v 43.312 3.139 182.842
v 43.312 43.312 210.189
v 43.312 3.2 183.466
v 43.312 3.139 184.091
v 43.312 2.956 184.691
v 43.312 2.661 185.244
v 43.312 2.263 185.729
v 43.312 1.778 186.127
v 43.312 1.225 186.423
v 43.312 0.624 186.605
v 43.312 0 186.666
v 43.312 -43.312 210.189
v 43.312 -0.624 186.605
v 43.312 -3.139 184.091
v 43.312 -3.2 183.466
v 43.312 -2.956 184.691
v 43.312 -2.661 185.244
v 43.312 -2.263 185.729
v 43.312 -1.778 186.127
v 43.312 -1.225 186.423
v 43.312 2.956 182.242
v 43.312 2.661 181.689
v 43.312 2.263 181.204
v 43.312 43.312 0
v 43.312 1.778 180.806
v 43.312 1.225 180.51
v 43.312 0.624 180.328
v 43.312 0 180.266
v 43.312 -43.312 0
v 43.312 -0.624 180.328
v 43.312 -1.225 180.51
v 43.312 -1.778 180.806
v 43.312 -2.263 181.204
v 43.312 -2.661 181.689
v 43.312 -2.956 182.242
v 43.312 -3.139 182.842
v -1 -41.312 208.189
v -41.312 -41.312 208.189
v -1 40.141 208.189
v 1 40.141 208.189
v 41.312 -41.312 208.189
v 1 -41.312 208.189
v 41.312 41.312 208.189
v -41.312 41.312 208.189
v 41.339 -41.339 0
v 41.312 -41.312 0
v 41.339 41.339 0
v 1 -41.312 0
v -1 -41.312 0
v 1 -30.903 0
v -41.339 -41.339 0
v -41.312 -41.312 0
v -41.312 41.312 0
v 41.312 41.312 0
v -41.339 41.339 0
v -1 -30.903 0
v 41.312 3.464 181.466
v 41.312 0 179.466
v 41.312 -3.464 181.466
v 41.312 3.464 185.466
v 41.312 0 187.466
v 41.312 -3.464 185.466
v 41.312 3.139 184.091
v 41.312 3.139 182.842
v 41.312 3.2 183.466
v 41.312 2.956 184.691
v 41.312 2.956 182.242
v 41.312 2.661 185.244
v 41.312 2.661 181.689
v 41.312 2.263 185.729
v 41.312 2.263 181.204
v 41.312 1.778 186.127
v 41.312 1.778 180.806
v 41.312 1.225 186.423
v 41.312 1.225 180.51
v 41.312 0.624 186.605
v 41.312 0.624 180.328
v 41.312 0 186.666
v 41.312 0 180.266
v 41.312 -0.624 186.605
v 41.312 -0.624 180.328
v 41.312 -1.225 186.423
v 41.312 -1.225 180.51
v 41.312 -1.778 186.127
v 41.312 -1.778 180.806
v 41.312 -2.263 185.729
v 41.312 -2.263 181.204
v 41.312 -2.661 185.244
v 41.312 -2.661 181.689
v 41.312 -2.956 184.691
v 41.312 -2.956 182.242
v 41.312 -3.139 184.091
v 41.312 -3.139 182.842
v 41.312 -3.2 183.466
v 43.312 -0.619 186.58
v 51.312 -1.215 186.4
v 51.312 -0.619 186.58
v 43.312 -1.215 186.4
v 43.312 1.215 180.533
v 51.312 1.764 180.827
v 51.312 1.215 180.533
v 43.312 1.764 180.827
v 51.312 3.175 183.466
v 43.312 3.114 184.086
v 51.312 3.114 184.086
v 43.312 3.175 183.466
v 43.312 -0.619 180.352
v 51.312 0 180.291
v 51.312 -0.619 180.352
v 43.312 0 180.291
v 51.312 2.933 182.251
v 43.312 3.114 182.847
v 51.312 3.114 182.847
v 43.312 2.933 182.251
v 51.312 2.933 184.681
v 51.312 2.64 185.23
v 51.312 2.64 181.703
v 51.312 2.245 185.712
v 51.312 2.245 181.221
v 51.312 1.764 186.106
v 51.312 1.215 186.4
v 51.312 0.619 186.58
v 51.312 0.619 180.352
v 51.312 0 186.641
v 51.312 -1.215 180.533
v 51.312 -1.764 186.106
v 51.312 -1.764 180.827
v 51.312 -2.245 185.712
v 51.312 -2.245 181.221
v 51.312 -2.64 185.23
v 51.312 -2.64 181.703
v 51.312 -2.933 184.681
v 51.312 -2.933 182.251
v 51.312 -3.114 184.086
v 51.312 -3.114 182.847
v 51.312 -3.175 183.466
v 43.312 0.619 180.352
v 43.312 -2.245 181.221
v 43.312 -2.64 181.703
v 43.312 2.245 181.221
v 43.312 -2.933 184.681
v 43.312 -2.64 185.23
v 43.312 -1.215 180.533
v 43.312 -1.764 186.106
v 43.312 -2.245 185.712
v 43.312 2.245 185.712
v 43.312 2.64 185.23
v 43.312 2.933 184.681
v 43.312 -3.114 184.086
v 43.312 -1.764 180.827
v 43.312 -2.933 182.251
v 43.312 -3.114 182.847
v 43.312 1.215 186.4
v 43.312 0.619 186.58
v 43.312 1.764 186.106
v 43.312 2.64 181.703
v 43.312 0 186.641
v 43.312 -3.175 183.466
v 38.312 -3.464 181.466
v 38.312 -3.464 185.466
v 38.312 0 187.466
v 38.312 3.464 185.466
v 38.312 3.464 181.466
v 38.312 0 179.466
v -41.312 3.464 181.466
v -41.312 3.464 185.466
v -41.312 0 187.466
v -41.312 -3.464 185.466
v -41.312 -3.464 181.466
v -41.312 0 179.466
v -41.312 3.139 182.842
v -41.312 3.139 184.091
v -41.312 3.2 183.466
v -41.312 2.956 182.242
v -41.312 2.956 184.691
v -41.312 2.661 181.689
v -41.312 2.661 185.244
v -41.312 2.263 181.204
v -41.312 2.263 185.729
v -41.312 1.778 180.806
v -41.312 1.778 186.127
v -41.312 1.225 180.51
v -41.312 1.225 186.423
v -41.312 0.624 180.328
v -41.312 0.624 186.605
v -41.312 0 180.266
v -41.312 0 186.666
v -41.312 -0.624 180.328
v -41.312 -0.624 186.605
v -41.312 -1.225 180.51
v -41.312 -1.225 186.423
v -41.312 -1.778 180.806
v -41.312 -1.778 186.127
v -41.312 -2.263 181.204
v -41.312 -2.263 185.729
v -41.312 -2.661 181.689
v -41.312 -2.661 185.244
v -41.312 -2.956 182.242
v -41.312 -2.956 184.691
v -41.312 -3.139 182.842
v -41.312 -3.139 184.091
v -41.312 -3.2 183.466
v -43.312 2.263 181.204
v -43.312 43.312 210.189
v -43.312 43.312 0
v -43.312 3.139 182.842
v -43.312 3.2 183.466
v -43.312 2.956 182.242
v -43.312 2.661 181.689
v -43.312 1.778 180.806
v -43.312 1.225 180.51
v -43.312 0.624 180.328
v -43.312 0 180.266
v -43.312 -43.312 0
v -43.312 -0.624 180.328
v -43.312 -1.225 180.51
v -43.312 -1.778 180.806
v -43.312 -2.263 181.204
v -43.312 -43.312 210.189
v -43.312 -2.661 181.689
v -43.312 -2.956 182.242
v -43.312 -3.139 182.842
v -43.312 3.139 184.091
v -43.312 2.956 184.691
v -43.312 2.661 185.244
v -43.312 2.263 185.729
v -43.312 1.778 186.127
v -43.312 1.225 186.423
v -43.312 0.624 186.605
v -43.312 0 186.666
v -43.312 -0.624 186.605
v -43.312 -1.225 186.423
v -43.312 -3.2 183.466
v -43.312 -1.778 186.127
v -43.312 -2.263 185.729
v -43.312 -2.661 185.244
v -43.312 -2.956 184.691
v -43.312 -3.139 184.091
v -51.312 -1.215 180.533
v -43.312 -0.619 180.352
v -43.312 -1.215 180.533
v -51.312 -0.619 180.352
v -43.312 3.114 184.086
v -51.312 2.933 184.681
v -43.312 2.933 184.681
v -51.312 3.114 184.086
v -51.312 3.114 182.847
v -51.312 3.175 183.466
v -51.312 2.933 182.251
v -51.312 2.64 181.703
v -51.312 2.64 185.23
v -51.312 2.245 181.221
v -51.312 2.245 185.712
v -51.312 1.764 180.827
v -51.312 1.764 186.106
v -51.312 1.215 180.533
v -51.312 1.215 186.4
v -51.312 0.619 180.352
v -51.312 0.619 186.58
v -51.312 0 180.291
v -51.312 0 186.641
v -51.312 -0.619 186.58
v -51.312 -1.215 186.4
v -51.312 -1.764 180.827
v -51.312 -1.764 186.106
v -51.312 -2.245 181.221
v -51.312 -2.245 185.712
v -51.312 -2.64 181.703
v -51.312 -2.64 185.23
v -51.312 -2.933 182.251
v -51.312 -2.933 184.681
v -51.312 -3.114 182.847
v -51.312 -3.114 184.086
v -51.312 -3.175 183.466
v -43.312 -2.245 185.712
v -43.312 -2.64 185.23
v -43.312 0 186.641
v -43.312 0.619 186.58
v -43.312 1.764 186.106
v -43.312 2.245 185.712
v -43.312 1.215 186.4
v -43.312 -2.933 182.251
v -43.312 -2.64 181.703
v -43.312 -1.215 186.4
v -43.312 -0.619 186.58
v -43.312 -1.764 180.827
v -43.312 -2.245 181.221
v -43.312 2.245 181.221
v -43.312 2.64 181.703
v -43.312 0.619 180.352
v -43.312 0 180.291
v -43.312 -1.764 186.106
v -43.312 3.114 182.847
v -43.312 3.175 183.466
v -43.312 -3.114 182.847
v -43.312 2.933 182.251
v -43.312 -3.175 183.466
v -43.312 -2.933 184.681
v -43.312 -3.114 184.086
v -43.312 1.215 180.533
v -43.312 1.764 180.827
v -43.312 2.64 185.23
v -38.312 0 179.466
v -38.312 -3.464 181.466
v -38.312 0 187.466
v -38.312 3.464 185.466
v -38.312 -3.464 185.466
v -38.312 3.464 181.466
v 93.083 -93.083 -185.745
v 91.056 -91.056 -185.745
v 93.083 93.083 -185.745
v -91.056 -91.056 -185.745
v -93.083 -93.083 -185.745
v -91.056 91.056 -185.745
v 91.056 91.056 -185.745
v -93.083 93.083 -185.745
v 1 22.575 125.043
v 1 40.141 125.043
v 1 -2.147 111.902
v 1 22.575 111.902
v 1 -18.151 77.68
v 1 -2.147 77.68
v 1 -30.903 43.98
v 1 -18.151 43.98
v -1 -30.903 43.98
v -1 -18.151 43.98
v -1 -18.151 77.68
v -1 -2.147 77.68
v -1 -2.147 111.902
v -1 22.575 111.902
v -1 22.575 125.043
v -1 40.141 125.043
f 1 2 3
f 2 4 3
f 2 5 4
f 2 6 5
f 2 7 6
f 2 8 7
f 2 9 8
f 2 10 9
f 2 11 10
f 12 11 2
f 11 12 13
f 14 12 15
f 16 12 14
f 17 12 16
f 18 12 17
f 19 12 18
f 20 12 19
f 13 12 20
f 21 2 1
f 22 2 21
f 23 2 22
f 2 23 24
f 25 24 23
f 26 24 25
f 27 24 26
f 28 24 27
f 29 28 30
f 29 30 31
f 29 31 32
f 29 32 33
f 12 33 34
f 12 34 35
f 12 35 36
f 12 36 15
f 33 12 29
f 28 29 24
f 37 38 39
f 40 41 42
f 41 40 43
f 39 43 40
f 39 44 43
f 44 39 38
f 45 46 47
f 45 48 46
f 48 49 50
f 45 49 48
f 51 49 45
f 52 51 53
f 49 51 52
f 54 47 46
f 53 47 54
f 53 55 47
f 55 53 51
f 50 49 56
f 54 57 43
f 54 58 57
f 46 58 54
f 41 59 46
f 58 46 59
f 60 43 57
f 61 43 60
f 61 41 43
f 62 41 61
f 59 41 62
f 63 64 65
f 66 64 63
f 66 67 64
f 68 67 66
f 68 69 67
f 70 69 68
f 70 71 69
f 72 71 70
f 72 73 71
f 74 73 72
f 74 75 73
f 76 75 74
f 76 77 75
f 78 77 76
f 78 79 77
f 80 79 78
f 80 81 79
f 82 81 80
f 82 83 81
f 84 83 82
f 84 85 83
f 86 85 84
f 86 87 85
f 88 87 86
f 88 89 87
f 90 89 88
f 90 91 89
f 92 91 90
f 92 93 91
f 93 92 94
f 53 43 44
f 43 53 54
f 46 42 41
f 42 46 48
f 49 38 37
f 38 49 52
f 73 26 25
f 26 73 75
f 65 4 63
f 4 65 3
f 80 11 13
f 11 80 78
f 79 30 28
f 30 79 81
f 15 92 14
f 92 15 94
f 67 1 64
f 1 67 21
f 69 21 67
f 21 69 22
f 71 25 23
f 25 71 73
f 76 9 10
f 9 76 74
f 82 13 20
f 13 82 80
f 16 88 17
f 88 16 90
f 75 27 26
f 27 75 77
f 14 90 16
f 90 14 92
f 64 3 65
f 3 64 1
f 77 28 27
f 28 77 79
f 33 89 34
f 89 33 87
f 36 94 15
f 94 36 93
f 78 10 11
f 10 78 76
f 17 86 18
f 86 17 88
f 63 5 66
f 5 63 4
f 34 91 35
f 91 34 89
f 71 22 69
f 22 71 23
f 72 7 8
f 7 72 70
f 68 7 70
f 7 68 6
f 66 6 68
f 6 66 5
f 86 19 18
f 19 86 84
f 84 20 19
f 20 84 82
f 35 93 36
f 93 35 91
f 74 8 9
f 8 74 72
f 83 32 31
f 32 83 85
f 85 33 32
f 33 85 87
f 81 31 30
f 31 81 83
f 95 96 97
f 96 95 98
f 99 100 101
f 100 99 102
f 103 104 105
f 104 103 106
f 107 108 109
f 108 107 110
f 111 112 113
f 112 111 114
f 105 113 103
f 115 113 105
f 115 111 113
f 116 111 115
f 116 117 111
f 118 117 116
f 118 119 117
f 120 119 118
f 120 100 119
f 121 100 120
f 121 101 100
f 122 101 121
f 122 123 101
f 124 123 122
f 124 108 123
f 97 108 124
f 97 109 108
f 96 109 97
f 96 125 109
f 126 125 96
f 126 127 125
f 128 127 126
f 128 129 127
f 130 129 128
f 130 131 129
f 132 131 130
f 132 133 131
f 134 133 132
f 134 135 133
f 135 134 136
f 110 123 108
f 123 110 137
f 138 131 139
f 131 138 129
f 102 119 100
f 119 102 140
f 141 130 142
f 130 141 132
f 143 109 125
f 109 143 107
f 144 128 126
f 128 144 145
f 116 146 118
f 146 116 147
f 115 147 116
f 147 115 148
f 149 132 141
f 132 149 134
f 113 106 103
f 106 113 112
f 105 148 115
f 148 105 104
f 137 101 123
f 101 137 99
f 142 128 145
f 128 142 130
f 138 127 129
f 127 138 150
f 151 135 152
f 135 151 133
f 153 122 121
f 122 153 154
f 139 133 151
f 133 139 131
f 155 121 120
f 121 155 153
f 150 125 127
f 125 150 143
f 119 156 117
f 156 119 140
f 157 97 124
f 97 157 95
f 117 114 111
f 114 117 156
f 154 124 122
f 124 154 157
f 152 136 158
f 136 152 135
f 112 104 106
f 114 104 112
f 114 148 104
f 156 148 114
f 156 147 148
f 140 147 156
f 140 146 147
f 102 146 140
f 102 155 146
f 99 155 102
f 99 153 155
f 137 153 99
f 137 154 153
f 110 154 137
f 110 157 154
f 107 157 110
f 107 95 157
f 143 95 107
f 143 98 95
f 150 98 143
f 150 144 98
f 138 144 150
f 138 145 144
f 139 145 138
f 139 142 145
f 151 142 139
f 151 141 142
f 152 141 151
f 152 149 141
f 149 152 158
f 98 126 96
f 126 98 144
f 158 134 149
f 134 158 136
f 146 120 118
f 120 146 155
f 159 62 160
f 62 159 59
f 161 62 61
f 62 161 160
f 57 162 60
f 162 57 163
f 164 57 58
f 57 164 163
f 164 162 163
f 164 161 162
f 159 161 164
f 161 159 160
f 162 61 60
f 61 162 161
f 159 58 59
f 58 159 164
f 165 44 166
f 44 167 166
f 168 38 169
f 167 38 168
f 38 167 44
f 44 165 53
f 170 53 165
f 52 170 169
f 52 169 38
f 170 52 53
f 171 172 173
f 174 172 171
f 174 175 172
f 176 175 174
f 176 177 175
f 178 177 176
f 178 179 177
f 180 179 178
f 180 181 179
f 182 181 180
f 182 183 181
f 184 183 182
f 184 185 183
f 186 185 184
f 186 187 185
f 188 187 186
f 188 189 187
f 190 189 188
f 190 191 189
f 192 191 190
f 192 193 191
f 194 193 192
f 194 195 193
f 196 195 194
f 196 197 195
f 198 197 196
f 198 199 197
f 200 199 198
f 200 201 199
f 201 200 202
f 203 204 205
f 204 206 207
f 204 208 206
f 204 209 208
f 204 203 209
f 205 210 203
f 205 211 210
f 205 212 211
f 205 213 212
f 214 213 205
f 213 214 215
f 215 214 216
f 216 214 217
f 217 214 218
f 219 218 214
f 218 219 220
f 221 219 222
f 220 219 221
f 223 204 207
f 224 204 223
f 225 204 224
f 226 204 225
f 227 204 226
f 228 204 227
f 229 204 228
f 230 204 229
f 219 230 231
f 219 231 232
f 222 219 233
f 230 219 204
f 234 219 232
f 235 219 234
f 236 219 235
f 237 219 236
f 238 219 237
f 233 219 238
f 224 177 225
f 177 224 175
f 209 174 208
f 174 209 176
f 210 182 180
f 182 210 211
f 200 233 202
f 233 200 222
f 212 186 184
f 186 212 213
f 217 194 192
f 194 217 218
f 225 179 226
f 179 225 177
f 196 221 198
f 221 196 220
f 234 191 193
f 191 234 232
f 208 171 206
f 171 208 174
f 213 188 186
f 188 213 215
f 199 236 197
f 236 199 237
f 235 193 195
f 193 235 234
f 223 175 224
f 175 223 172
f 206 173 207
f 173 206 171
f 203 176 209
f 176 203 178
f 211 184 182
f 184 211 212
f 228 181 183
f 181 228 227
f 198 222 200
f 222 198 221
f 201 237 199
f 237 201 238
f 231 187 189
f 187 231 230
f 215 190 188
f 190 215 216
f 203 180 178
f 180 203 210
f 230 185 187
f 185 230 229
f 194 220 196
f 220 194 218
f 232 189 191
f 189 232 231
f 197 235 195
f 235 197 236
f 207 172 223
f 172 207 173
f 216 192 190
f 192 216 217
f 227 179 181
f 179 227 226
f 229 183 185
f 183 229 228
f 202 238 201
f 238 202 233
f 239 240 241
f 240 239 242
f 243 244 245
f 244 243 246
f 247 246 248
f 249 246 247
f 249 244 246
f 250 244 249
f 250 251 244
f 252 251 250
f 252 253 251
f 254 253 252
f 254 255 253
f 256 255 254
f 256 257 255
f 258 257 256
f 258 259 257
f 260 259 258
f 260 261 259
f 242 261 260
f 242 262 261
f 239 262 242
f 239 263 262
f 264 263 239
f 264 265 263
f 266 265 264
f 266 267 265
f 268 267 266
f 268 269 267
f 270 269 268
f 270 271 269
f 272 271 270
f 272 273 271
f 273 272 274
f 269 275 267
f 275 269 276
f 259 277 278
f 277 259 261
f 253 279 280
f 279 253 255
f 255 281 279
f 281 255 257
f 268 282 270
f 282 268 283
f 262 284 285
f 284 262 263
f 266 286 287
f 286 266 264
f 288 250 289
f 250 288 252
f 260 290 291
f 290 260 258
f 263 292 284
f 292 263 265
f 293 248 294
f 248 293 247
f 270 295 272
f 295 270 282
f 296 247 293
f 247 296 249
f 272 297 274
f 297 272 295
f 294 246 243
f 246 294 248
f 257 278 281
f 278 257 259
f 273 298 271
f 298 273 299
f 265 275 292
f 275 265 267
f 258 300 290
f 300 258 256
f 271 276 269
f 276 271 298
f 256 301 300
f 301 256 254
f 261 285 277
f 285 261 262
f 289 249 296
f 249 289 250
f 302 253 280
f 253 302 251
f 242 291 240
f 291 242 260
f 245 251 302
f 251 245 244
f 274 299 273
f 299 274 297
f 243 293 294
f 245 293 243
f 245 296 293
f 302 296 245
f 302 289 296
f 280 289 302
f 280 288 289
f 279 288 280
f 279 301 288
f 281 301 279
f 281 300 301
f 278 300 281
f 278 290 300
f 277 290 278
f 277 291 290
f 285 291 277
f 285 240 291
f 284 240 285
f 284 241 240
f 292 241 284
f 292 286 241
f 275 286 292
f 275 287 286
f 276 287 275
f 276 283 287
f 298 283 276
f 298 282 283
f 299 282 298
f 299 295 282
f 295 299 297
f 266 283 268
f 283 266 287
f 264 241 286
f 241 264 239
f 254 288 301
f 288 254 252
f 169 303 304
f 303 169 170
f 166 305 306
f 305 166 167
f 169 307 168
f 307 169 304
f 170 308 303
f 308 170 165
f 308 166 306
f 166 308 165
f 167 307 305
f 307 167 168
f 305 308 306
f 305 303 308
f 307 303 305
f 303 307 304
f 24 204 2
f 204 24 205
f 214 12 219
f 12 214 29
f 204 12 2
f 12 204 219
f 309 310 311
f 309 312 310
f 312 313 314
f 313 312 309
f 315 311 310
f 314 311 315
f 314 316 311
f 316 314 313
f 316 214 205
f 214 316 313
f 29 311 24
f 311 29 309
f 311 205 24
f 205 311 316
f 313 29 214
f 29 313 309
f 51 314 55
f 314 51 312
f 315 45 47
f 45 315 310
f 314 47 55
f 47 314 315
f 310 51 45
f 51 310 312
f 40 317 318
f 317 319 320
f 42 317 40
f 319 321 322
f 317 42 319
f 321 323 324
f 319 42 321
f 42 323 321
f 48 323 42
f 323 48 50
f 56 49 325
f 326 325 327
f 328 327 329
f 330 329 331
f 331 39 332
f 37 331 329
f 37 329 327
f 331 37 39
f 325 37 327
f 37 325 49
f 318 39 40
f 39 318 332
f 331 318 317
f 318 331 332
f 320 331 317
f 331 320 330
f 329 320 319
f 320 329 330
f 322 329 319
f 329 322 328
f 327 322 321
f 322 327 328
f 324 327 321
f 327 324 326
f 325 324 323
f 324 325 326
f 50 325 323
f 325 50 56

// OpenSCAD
// OK1DFC Stepped Septum Feed for 2304 MHz — v9
// ORI / W5NYV — April 2026
//
// CONSTRUCTION: Sheet metal, 2mm 6061 aluminum throughout
// PIECES:
//   1. U-channel half A  — wide face + two flanges (bent from flat blank)
//   2. U-channel half B  — same, mirrors A
//   3. Septum plate      — stepped flat plate with flanges,
//                          captured between U-channel flanges when assembled
//   4. Back plate        — closes backshort end, flanged all four sides
//   + Flare              — aluminum flashing, square-to-circular, separate piece
//                          (KA1GT/KA1GT construction: rolled cylinder, one end deformed to square)
//
// ALL PROPORTIONAL CONSTANTS from Chen & Tsandoulas stepped septum paper
// Scaled via OK1DFC spreadsheet. Verified by W1GHZ HFSS simulation.
// Design proven at 1296, 2320, 3400 MHz by KI6DHU, KL6M, KA1GT, RA3AQ and others.
//
// ELECTRICAL SURFACES ONLY — flanges and bend allowances not modeled.
// This file is the ground truth for electrical dimensions.

// ============================================================
// PARAMETERS
// ============================================================
lambda    = 299792 / 2304;
t         = 2.0;             // sheet thickness — 2mm Al everywhere

wg_id     = 0.635 * lambda;  // inner dimension
// 0.635 is from the Chen & Tsandoulas paper on stepped septum polarizers
wg_od     = wg_id + 2*t;     // outer dimension

// step positions along the length of the septum
sA = 0.338 * lambda;
sB = 0.597 * lambda;
sC = 0.860 * lambda;
sD = 0.961 * lambda;

body_len = 1.600 * lambda;   // calculated minimum body length

// Body length needs to be long enough for the following things.
//1. Section before septum starts:    allow spurious modes to die out
//                                    so only TE10 reaches the septum.
//                                    This means we're single mode.
//2. The four stepped sections:       A through D = 0.961λ total
//                                    The A, B, C, D positions
//                                    create exactly 90° phase difference 
//                                    between the TE10 and TE01 modes 
//                                    at the design frequency.
//3. Full-height section after sD:    from sD to body_len = 0.639λ
//                                    allows modes to recombine cleanly.

//heights of each step of our septum profile
sF = 0.080 * lambda;
sG = 0.178 * lambda;
sH = 0.301 * lambda;
sI = 0.491 * lambda;
sJ = 0.626 * lambda;         

//The steps are carefully calculated to create exactly 90° of phase 
//difference between the two polarization components, which is 
//what produces circular polarization.


// Next, we get the probe position, measured from the back plate 
// toward the aperture. This is the distance that places the probe 
// at the correct location in the standing wave pattern inside 
// the waveguide for maximum good vibes. 

probe_z_from_end = 0.190 * lambda;

// SMA female bulkhead connector
// Huber+Suhner 21_SMA-50-2-15/111_NE (Paul Wade W1GHZ has multiples in stock)
// Straight bulkhead jack, solder attachment, 18 GHz, 50 ohm
// Designed for .086" semi-rigid cable (RG405)
// Center contact: solder cup, ~0.5-0.6mm hole for center conductor
// Body OD: 6.35mm (standard SMA)
// Panel hole: 6.4mm (6.35mm body + 0.05mm clearance)
// Nut: standard SMA hex nut, tightens on inside of wall
// Probe pin: ~0.5mm solid copper or brass wire, soldered into solder cup
//            total pin length = 24.1mm from inner wall face (M = 0.185*lambda)
//            cut wire to: 24.1mm + solder cup depth (~3mm) = ~27mm
sma_hole_d     = 6.4;    // panel hole (6.35mm body + 0.05mm clearance)
sma_body_d     = 6.35;   // SMA body OD (standard)
sma_nut_d      = 8.0;    // hex nut across flats (standard SMA)
sma_nut_t      = 3.0;    // hex nut thickness (protrudes this far into bore)

// Flare parameters — W1GHZ square pyramid flare
// From W1GHZ SEPTUM.pdf: 1.4λ square aperture, 15° half-angle
// specifically designed for offset dishes (our f/D = 0.83)
// "this size diagonal horn with linear polarization is a good feed for an offset dish"
flare_id  = 1.4 * lambda;    // 182.2mm inner aperture (square)
flare_ang = 15;              // half-angle degrees (W1GHZ)
flare_len = (flare_id - wg_id) / (2 * tan(flare_ang));  // 186mm
flare_od  = flare_id + 2*t;  // 186.2mm outer

// ============================================================
// BODY WALLS — four flat rectangular sheets
// ============================================================
module wall_top() {
    translate([-wg_od/2, wg_id/2, 0])
        cube([wg_od, t, body_len]);
}

module wall_bottom() {
    translate([-wg_od/2, -wg_id/2 - t, 0])
        cube([wg_od, t, body_len]);
}

module wall_right() {
    pz = body_len - probe_z_from_end;
    difference() {
        translate([wg_id/2, -wg_id/2, 0])
            cube([t, wg_id, body_len]);
        // TX probe hole — SMA bulkhead body passes through
        translate([wg_id/2 - 0.1, 0, pz])
            rotate([0, 90, 0])
                cylinder(h=t + 1, d=sma_hole_d, $fn=32);
    }
    // SMA bulkhead body on outside, nut on inside
    translate([wg_id/2 + t, 0, pz])
        rotate([0, 90, 0])
            sma_bulkhead();
    // Hex nut on inside of bore
    translate([wg_id/2, 0, pz])
        rotate([0, -90, 0])
            sma_nut();
}

module wall_left() {
    pz = body_len - probe_z_from_end;
    difference() {
        translate([-wg_id/2 - t, -wg_id/2, 0])
            cube([t, wg_id, body_len]);
        // RX probe hole
        translate([-wg_id/2 - t - 0.1, 0, pz])
            rotate([0, 90, 0])
                cylinder(h=t + 1, d=sma_hole_d, $fn=32);
    }
    // SMA bulkhead body on outside, nut on inside
    translate([-wg_id/2 - t, 0, pz])
        rotate([0, -90, 0])
            sma_bulkhead();
    // Hex nut on inside of bore
    translate([-wg_id/2, 0, pz])
        rotate([0, 90, 0])
            sma_nut();
}

module back_plate() {
    translate([-wg_od/2, -wg_od/2, body_len])
        cube([wg_od, wg_od, t]);
}

module body_assembly() {
    wall_top();
    wall_bottom();
    wall_right();
    wall_left();
    back_plate();
}

// ============================================================
// SEPTUM PLATE — stepped flat sheet
// Stands upright at Y=0 centerline, steps grow in +Y (Half A side)
// Step lengths run along Z (feed axis), thickness t in X
// Slides in from aperture (Z=0) before back plate is installed
// ============================================================
module septum_plate() {
    // Flat stepped plate — OK1DFC original values
    // Bottom edge rests on bore floor (Y = -wg_id/2)
    // Stepped top edge grows from sF (aperture) to sJ≈wg_id (backshort)
    // Polygon X = Z in world (feed axis), Polygon Y = plate height
    // Translate -wg_id/2 so bottom sits on bore floor wall
    translate([t/2, -wg_id/2, 0])
    rotate([0, -90, 0])
    linear_extrude(t) {
        polygon(points=[
            [0,        sF],
            [sA,       sF],
            [sA,       sG],
            [sB,       sG],
            [sB,       sH],
            [sC,       sH],
            [sC,       sI],
            [sD,       sI],
            [sD,       sJ],
            [body_len, sJ],
            [body_len, 0],
            [0,        0]
        ]);
    }
}


// ============================================================
// FLARE — square pyramid frustum (W1GHZ design for offset dishes)
// Aperture: 1.4λ square, half-angle: 15°
// From W1GHZ SEPTUM.pdf: designed specifically for offset dishes
// body end at Z=0, aperture end at Z=-flare_len
// ============================================================
module flare_outer() {
    // Wide end at aperture (Z=-flare_len), narrow end at body (Z=0)
    translate([0, 0, -flare_len])
    linear_extrude(flare_len, scale=[wg_od/flare_od, wg_od/flare_od])
        square([flare_od, flare_od], center=true);
}

module flare_bore() {
    translate([0, 0, -flare_len - 0.1])
    linear_extrude(flare_len + 0.2, scale=[wg_id/flare_id, wg_id/flare_id])
        square([flare_id, flare_id], center=true);
}

module flare_assembly() {
    difference() {
        flare_outer();
        flare_bore();
    }
}

// ============================================================
// SMA BULKHEAD CONNECTOR — body on outside, nut on inside
// KI6DHU approach: direct mount through wall, no backing plate
// Amphenol RF 132150 or similar SMA female bulkhead
// ============================================================
module sma_bulkhead() {
    // Connector body protruding outside wall
    cylinder(h=8, d=sma_body_d, $fn=32);
}

module sma_nut() {
    // Hex nut on inside of bore — protrudes ~3mm into bore
    // Small perturbation at 2304 MHz / 20W — acceptable
    cylinder(h=sma_nut_t, d=sma_nut_d, $fn=6);
}

// ============================================================
// RENDER — uncomment one section at a time
// ============================================================

// --- FULL ASSEMBLY ---
body_assembly();
septum_plate();
                      flare_assembly();

// --- INDIVIDUAL PARTS FOR EXPORT ---
// Body wall (all 4 identical rectangles):
//translate([0, 0, 0]) cube([body_len, wg_od, t]);

// Back plate:
//cube([wg_od, wg_od, t]);

// Septum plate (lying flat for printing):
// rotate([0, 0, 0]) septum_plate();

// Flare only:
// flare_assembly();

// ============================================================
echo("=== OK1DFC SEPTUM FEED 2304 MHz v7 — ORI / W5NYV ===");
echo("");
echo("--- SOURCE ---");
echo("All proportional constants: Chen & Tsandoulas stepped septum paper");
echo("Scaled by OK1DFC spreadsheet. Verified by W1GHZ HFSS simulation.");
echo("Built at 1296, 2320, 3400 MHz: KI6DHU KL6M KA1GT RA3AQ and others.");
echo("");
echo("--- FREQUENCY AND WAVELENGTH ---");
echo("Design frequency: 2304 MHz");
echo("c = 299792 km/s (precise)");
echo("lambda:", lambda, "mm");
echo("");
echo("--- WAVEGUIDE BODY ---");
echo("wg_id = 0.635*lambda:", wg_id, "mm  (fixed by Chen & Tsandoulas)");
echo("wg_od = wg_id + 2*t:", wg_od, "mm  (t=2mm sheet)");
echo("body_len = 1.600*lambda:", body_len, "mm  (minimum for transformer to work)");
echo("");
echo("--- SEPTUM STEP POSITIONS (from aperture, Chen & Tsandoulas) ---");
echo("sA = 0.338*lambda:", sA, "mm");
echo("sB = 0.597*lambda:", sB, "mm");
echo("sC = 0.860*lambda:", sC, "mm");
echo("sD = 0.961*lambda:", sD, "mm");
echo("");
echo("--- SEPTUM STEP HEIGHTS (from bore floor, Chen & Tsandoulas) ---");
echo("sF = 0.080*lambda:", sF, "mm  (narrowest, aperture end)");
echo("sG = 0.178*lambda:", sG, "mm");
echo("sH = 0.301*lambda:", sH, "mm");
echo("sI = 0.491*lambda:", sI, "mm");
echo("sJ = 0.626*lambda:", sJ, "mm  (full bore width, backshort end)");
echo("");
echo("--- PROBE (OK1DFC spreadsheet, from Chen & Tsandoulas) ---");
echo("L=0.190*lambda — probe Z from back plate:", probe_z_from_end, "mm");
echo("M=0.185*lambda — probe pin length (trim to this from inner wall):", 0.185*lambda, "mm");
echo("probe Z from aperture:", body_len - probe_z_from_end, "mm");
echo("");
echo("--- FLARE (W1GHZ square pyramid, designed for offset dishes) ---");
echo("Aperture: 1.4*lambda =", flare_id, "mm square inner");
echo("Half-angle:", flare_ang, "degrees");
echo("Flare length:", flare_len, "mm");
echo("Reference: W1GHZ SEPTUM.pdf — 1.4-lambda square aperture for offset dish f/D ~0.75-0.83");
echo("");
echo("--- FLAT BLANK CUT LIST (IMS San Diego, 2mm 6061 Al) ---");
echo("U-channel halves x2 (wide face + two flanges each):");
echo("  length:", body_len, "mm");
echo("  width: wg_od + 2*(wg_id/2 + t) =", wg_od + 2*(wg_id/2 + t), "mm");
echo("Septum plate x1 (with flanges, captured between U-channels):");
echo("  length:", body_len, "mm");
echo("  width: wg_id + 2*t =", wg_id + 2*t, "mm");
echo("Back plate x1 (flanged all four sides): approx", wg_od+20, "x", wg_od+20, "mm");
echo("");
echo("--- SMA CONNECTORS (confirmed in stock, W1GHZ Paul Wade) ---");
echo("Huber+Suhner 21_SMA-50-2-15/111_NE");
echo("Straight bulkhead jack, solder, 18 GHz, 50 ohm");
echo("Panel hole diameter:", sma_hole_d, "mm  (6.35mm body + 0.05mm clearance)");
echo("Nut protrusion into bore:", sma_nut_t, "mm");
echo("Probe pin: ~0.5mm solid wire, soldered into solder cup");
echo("Probe pin total length: 24.1 + 3mm cup depth = ~27mm");
echo("Probe extends into bore M=0.185*lambda:", 0.185*lambda, "mm from inner wall face");
